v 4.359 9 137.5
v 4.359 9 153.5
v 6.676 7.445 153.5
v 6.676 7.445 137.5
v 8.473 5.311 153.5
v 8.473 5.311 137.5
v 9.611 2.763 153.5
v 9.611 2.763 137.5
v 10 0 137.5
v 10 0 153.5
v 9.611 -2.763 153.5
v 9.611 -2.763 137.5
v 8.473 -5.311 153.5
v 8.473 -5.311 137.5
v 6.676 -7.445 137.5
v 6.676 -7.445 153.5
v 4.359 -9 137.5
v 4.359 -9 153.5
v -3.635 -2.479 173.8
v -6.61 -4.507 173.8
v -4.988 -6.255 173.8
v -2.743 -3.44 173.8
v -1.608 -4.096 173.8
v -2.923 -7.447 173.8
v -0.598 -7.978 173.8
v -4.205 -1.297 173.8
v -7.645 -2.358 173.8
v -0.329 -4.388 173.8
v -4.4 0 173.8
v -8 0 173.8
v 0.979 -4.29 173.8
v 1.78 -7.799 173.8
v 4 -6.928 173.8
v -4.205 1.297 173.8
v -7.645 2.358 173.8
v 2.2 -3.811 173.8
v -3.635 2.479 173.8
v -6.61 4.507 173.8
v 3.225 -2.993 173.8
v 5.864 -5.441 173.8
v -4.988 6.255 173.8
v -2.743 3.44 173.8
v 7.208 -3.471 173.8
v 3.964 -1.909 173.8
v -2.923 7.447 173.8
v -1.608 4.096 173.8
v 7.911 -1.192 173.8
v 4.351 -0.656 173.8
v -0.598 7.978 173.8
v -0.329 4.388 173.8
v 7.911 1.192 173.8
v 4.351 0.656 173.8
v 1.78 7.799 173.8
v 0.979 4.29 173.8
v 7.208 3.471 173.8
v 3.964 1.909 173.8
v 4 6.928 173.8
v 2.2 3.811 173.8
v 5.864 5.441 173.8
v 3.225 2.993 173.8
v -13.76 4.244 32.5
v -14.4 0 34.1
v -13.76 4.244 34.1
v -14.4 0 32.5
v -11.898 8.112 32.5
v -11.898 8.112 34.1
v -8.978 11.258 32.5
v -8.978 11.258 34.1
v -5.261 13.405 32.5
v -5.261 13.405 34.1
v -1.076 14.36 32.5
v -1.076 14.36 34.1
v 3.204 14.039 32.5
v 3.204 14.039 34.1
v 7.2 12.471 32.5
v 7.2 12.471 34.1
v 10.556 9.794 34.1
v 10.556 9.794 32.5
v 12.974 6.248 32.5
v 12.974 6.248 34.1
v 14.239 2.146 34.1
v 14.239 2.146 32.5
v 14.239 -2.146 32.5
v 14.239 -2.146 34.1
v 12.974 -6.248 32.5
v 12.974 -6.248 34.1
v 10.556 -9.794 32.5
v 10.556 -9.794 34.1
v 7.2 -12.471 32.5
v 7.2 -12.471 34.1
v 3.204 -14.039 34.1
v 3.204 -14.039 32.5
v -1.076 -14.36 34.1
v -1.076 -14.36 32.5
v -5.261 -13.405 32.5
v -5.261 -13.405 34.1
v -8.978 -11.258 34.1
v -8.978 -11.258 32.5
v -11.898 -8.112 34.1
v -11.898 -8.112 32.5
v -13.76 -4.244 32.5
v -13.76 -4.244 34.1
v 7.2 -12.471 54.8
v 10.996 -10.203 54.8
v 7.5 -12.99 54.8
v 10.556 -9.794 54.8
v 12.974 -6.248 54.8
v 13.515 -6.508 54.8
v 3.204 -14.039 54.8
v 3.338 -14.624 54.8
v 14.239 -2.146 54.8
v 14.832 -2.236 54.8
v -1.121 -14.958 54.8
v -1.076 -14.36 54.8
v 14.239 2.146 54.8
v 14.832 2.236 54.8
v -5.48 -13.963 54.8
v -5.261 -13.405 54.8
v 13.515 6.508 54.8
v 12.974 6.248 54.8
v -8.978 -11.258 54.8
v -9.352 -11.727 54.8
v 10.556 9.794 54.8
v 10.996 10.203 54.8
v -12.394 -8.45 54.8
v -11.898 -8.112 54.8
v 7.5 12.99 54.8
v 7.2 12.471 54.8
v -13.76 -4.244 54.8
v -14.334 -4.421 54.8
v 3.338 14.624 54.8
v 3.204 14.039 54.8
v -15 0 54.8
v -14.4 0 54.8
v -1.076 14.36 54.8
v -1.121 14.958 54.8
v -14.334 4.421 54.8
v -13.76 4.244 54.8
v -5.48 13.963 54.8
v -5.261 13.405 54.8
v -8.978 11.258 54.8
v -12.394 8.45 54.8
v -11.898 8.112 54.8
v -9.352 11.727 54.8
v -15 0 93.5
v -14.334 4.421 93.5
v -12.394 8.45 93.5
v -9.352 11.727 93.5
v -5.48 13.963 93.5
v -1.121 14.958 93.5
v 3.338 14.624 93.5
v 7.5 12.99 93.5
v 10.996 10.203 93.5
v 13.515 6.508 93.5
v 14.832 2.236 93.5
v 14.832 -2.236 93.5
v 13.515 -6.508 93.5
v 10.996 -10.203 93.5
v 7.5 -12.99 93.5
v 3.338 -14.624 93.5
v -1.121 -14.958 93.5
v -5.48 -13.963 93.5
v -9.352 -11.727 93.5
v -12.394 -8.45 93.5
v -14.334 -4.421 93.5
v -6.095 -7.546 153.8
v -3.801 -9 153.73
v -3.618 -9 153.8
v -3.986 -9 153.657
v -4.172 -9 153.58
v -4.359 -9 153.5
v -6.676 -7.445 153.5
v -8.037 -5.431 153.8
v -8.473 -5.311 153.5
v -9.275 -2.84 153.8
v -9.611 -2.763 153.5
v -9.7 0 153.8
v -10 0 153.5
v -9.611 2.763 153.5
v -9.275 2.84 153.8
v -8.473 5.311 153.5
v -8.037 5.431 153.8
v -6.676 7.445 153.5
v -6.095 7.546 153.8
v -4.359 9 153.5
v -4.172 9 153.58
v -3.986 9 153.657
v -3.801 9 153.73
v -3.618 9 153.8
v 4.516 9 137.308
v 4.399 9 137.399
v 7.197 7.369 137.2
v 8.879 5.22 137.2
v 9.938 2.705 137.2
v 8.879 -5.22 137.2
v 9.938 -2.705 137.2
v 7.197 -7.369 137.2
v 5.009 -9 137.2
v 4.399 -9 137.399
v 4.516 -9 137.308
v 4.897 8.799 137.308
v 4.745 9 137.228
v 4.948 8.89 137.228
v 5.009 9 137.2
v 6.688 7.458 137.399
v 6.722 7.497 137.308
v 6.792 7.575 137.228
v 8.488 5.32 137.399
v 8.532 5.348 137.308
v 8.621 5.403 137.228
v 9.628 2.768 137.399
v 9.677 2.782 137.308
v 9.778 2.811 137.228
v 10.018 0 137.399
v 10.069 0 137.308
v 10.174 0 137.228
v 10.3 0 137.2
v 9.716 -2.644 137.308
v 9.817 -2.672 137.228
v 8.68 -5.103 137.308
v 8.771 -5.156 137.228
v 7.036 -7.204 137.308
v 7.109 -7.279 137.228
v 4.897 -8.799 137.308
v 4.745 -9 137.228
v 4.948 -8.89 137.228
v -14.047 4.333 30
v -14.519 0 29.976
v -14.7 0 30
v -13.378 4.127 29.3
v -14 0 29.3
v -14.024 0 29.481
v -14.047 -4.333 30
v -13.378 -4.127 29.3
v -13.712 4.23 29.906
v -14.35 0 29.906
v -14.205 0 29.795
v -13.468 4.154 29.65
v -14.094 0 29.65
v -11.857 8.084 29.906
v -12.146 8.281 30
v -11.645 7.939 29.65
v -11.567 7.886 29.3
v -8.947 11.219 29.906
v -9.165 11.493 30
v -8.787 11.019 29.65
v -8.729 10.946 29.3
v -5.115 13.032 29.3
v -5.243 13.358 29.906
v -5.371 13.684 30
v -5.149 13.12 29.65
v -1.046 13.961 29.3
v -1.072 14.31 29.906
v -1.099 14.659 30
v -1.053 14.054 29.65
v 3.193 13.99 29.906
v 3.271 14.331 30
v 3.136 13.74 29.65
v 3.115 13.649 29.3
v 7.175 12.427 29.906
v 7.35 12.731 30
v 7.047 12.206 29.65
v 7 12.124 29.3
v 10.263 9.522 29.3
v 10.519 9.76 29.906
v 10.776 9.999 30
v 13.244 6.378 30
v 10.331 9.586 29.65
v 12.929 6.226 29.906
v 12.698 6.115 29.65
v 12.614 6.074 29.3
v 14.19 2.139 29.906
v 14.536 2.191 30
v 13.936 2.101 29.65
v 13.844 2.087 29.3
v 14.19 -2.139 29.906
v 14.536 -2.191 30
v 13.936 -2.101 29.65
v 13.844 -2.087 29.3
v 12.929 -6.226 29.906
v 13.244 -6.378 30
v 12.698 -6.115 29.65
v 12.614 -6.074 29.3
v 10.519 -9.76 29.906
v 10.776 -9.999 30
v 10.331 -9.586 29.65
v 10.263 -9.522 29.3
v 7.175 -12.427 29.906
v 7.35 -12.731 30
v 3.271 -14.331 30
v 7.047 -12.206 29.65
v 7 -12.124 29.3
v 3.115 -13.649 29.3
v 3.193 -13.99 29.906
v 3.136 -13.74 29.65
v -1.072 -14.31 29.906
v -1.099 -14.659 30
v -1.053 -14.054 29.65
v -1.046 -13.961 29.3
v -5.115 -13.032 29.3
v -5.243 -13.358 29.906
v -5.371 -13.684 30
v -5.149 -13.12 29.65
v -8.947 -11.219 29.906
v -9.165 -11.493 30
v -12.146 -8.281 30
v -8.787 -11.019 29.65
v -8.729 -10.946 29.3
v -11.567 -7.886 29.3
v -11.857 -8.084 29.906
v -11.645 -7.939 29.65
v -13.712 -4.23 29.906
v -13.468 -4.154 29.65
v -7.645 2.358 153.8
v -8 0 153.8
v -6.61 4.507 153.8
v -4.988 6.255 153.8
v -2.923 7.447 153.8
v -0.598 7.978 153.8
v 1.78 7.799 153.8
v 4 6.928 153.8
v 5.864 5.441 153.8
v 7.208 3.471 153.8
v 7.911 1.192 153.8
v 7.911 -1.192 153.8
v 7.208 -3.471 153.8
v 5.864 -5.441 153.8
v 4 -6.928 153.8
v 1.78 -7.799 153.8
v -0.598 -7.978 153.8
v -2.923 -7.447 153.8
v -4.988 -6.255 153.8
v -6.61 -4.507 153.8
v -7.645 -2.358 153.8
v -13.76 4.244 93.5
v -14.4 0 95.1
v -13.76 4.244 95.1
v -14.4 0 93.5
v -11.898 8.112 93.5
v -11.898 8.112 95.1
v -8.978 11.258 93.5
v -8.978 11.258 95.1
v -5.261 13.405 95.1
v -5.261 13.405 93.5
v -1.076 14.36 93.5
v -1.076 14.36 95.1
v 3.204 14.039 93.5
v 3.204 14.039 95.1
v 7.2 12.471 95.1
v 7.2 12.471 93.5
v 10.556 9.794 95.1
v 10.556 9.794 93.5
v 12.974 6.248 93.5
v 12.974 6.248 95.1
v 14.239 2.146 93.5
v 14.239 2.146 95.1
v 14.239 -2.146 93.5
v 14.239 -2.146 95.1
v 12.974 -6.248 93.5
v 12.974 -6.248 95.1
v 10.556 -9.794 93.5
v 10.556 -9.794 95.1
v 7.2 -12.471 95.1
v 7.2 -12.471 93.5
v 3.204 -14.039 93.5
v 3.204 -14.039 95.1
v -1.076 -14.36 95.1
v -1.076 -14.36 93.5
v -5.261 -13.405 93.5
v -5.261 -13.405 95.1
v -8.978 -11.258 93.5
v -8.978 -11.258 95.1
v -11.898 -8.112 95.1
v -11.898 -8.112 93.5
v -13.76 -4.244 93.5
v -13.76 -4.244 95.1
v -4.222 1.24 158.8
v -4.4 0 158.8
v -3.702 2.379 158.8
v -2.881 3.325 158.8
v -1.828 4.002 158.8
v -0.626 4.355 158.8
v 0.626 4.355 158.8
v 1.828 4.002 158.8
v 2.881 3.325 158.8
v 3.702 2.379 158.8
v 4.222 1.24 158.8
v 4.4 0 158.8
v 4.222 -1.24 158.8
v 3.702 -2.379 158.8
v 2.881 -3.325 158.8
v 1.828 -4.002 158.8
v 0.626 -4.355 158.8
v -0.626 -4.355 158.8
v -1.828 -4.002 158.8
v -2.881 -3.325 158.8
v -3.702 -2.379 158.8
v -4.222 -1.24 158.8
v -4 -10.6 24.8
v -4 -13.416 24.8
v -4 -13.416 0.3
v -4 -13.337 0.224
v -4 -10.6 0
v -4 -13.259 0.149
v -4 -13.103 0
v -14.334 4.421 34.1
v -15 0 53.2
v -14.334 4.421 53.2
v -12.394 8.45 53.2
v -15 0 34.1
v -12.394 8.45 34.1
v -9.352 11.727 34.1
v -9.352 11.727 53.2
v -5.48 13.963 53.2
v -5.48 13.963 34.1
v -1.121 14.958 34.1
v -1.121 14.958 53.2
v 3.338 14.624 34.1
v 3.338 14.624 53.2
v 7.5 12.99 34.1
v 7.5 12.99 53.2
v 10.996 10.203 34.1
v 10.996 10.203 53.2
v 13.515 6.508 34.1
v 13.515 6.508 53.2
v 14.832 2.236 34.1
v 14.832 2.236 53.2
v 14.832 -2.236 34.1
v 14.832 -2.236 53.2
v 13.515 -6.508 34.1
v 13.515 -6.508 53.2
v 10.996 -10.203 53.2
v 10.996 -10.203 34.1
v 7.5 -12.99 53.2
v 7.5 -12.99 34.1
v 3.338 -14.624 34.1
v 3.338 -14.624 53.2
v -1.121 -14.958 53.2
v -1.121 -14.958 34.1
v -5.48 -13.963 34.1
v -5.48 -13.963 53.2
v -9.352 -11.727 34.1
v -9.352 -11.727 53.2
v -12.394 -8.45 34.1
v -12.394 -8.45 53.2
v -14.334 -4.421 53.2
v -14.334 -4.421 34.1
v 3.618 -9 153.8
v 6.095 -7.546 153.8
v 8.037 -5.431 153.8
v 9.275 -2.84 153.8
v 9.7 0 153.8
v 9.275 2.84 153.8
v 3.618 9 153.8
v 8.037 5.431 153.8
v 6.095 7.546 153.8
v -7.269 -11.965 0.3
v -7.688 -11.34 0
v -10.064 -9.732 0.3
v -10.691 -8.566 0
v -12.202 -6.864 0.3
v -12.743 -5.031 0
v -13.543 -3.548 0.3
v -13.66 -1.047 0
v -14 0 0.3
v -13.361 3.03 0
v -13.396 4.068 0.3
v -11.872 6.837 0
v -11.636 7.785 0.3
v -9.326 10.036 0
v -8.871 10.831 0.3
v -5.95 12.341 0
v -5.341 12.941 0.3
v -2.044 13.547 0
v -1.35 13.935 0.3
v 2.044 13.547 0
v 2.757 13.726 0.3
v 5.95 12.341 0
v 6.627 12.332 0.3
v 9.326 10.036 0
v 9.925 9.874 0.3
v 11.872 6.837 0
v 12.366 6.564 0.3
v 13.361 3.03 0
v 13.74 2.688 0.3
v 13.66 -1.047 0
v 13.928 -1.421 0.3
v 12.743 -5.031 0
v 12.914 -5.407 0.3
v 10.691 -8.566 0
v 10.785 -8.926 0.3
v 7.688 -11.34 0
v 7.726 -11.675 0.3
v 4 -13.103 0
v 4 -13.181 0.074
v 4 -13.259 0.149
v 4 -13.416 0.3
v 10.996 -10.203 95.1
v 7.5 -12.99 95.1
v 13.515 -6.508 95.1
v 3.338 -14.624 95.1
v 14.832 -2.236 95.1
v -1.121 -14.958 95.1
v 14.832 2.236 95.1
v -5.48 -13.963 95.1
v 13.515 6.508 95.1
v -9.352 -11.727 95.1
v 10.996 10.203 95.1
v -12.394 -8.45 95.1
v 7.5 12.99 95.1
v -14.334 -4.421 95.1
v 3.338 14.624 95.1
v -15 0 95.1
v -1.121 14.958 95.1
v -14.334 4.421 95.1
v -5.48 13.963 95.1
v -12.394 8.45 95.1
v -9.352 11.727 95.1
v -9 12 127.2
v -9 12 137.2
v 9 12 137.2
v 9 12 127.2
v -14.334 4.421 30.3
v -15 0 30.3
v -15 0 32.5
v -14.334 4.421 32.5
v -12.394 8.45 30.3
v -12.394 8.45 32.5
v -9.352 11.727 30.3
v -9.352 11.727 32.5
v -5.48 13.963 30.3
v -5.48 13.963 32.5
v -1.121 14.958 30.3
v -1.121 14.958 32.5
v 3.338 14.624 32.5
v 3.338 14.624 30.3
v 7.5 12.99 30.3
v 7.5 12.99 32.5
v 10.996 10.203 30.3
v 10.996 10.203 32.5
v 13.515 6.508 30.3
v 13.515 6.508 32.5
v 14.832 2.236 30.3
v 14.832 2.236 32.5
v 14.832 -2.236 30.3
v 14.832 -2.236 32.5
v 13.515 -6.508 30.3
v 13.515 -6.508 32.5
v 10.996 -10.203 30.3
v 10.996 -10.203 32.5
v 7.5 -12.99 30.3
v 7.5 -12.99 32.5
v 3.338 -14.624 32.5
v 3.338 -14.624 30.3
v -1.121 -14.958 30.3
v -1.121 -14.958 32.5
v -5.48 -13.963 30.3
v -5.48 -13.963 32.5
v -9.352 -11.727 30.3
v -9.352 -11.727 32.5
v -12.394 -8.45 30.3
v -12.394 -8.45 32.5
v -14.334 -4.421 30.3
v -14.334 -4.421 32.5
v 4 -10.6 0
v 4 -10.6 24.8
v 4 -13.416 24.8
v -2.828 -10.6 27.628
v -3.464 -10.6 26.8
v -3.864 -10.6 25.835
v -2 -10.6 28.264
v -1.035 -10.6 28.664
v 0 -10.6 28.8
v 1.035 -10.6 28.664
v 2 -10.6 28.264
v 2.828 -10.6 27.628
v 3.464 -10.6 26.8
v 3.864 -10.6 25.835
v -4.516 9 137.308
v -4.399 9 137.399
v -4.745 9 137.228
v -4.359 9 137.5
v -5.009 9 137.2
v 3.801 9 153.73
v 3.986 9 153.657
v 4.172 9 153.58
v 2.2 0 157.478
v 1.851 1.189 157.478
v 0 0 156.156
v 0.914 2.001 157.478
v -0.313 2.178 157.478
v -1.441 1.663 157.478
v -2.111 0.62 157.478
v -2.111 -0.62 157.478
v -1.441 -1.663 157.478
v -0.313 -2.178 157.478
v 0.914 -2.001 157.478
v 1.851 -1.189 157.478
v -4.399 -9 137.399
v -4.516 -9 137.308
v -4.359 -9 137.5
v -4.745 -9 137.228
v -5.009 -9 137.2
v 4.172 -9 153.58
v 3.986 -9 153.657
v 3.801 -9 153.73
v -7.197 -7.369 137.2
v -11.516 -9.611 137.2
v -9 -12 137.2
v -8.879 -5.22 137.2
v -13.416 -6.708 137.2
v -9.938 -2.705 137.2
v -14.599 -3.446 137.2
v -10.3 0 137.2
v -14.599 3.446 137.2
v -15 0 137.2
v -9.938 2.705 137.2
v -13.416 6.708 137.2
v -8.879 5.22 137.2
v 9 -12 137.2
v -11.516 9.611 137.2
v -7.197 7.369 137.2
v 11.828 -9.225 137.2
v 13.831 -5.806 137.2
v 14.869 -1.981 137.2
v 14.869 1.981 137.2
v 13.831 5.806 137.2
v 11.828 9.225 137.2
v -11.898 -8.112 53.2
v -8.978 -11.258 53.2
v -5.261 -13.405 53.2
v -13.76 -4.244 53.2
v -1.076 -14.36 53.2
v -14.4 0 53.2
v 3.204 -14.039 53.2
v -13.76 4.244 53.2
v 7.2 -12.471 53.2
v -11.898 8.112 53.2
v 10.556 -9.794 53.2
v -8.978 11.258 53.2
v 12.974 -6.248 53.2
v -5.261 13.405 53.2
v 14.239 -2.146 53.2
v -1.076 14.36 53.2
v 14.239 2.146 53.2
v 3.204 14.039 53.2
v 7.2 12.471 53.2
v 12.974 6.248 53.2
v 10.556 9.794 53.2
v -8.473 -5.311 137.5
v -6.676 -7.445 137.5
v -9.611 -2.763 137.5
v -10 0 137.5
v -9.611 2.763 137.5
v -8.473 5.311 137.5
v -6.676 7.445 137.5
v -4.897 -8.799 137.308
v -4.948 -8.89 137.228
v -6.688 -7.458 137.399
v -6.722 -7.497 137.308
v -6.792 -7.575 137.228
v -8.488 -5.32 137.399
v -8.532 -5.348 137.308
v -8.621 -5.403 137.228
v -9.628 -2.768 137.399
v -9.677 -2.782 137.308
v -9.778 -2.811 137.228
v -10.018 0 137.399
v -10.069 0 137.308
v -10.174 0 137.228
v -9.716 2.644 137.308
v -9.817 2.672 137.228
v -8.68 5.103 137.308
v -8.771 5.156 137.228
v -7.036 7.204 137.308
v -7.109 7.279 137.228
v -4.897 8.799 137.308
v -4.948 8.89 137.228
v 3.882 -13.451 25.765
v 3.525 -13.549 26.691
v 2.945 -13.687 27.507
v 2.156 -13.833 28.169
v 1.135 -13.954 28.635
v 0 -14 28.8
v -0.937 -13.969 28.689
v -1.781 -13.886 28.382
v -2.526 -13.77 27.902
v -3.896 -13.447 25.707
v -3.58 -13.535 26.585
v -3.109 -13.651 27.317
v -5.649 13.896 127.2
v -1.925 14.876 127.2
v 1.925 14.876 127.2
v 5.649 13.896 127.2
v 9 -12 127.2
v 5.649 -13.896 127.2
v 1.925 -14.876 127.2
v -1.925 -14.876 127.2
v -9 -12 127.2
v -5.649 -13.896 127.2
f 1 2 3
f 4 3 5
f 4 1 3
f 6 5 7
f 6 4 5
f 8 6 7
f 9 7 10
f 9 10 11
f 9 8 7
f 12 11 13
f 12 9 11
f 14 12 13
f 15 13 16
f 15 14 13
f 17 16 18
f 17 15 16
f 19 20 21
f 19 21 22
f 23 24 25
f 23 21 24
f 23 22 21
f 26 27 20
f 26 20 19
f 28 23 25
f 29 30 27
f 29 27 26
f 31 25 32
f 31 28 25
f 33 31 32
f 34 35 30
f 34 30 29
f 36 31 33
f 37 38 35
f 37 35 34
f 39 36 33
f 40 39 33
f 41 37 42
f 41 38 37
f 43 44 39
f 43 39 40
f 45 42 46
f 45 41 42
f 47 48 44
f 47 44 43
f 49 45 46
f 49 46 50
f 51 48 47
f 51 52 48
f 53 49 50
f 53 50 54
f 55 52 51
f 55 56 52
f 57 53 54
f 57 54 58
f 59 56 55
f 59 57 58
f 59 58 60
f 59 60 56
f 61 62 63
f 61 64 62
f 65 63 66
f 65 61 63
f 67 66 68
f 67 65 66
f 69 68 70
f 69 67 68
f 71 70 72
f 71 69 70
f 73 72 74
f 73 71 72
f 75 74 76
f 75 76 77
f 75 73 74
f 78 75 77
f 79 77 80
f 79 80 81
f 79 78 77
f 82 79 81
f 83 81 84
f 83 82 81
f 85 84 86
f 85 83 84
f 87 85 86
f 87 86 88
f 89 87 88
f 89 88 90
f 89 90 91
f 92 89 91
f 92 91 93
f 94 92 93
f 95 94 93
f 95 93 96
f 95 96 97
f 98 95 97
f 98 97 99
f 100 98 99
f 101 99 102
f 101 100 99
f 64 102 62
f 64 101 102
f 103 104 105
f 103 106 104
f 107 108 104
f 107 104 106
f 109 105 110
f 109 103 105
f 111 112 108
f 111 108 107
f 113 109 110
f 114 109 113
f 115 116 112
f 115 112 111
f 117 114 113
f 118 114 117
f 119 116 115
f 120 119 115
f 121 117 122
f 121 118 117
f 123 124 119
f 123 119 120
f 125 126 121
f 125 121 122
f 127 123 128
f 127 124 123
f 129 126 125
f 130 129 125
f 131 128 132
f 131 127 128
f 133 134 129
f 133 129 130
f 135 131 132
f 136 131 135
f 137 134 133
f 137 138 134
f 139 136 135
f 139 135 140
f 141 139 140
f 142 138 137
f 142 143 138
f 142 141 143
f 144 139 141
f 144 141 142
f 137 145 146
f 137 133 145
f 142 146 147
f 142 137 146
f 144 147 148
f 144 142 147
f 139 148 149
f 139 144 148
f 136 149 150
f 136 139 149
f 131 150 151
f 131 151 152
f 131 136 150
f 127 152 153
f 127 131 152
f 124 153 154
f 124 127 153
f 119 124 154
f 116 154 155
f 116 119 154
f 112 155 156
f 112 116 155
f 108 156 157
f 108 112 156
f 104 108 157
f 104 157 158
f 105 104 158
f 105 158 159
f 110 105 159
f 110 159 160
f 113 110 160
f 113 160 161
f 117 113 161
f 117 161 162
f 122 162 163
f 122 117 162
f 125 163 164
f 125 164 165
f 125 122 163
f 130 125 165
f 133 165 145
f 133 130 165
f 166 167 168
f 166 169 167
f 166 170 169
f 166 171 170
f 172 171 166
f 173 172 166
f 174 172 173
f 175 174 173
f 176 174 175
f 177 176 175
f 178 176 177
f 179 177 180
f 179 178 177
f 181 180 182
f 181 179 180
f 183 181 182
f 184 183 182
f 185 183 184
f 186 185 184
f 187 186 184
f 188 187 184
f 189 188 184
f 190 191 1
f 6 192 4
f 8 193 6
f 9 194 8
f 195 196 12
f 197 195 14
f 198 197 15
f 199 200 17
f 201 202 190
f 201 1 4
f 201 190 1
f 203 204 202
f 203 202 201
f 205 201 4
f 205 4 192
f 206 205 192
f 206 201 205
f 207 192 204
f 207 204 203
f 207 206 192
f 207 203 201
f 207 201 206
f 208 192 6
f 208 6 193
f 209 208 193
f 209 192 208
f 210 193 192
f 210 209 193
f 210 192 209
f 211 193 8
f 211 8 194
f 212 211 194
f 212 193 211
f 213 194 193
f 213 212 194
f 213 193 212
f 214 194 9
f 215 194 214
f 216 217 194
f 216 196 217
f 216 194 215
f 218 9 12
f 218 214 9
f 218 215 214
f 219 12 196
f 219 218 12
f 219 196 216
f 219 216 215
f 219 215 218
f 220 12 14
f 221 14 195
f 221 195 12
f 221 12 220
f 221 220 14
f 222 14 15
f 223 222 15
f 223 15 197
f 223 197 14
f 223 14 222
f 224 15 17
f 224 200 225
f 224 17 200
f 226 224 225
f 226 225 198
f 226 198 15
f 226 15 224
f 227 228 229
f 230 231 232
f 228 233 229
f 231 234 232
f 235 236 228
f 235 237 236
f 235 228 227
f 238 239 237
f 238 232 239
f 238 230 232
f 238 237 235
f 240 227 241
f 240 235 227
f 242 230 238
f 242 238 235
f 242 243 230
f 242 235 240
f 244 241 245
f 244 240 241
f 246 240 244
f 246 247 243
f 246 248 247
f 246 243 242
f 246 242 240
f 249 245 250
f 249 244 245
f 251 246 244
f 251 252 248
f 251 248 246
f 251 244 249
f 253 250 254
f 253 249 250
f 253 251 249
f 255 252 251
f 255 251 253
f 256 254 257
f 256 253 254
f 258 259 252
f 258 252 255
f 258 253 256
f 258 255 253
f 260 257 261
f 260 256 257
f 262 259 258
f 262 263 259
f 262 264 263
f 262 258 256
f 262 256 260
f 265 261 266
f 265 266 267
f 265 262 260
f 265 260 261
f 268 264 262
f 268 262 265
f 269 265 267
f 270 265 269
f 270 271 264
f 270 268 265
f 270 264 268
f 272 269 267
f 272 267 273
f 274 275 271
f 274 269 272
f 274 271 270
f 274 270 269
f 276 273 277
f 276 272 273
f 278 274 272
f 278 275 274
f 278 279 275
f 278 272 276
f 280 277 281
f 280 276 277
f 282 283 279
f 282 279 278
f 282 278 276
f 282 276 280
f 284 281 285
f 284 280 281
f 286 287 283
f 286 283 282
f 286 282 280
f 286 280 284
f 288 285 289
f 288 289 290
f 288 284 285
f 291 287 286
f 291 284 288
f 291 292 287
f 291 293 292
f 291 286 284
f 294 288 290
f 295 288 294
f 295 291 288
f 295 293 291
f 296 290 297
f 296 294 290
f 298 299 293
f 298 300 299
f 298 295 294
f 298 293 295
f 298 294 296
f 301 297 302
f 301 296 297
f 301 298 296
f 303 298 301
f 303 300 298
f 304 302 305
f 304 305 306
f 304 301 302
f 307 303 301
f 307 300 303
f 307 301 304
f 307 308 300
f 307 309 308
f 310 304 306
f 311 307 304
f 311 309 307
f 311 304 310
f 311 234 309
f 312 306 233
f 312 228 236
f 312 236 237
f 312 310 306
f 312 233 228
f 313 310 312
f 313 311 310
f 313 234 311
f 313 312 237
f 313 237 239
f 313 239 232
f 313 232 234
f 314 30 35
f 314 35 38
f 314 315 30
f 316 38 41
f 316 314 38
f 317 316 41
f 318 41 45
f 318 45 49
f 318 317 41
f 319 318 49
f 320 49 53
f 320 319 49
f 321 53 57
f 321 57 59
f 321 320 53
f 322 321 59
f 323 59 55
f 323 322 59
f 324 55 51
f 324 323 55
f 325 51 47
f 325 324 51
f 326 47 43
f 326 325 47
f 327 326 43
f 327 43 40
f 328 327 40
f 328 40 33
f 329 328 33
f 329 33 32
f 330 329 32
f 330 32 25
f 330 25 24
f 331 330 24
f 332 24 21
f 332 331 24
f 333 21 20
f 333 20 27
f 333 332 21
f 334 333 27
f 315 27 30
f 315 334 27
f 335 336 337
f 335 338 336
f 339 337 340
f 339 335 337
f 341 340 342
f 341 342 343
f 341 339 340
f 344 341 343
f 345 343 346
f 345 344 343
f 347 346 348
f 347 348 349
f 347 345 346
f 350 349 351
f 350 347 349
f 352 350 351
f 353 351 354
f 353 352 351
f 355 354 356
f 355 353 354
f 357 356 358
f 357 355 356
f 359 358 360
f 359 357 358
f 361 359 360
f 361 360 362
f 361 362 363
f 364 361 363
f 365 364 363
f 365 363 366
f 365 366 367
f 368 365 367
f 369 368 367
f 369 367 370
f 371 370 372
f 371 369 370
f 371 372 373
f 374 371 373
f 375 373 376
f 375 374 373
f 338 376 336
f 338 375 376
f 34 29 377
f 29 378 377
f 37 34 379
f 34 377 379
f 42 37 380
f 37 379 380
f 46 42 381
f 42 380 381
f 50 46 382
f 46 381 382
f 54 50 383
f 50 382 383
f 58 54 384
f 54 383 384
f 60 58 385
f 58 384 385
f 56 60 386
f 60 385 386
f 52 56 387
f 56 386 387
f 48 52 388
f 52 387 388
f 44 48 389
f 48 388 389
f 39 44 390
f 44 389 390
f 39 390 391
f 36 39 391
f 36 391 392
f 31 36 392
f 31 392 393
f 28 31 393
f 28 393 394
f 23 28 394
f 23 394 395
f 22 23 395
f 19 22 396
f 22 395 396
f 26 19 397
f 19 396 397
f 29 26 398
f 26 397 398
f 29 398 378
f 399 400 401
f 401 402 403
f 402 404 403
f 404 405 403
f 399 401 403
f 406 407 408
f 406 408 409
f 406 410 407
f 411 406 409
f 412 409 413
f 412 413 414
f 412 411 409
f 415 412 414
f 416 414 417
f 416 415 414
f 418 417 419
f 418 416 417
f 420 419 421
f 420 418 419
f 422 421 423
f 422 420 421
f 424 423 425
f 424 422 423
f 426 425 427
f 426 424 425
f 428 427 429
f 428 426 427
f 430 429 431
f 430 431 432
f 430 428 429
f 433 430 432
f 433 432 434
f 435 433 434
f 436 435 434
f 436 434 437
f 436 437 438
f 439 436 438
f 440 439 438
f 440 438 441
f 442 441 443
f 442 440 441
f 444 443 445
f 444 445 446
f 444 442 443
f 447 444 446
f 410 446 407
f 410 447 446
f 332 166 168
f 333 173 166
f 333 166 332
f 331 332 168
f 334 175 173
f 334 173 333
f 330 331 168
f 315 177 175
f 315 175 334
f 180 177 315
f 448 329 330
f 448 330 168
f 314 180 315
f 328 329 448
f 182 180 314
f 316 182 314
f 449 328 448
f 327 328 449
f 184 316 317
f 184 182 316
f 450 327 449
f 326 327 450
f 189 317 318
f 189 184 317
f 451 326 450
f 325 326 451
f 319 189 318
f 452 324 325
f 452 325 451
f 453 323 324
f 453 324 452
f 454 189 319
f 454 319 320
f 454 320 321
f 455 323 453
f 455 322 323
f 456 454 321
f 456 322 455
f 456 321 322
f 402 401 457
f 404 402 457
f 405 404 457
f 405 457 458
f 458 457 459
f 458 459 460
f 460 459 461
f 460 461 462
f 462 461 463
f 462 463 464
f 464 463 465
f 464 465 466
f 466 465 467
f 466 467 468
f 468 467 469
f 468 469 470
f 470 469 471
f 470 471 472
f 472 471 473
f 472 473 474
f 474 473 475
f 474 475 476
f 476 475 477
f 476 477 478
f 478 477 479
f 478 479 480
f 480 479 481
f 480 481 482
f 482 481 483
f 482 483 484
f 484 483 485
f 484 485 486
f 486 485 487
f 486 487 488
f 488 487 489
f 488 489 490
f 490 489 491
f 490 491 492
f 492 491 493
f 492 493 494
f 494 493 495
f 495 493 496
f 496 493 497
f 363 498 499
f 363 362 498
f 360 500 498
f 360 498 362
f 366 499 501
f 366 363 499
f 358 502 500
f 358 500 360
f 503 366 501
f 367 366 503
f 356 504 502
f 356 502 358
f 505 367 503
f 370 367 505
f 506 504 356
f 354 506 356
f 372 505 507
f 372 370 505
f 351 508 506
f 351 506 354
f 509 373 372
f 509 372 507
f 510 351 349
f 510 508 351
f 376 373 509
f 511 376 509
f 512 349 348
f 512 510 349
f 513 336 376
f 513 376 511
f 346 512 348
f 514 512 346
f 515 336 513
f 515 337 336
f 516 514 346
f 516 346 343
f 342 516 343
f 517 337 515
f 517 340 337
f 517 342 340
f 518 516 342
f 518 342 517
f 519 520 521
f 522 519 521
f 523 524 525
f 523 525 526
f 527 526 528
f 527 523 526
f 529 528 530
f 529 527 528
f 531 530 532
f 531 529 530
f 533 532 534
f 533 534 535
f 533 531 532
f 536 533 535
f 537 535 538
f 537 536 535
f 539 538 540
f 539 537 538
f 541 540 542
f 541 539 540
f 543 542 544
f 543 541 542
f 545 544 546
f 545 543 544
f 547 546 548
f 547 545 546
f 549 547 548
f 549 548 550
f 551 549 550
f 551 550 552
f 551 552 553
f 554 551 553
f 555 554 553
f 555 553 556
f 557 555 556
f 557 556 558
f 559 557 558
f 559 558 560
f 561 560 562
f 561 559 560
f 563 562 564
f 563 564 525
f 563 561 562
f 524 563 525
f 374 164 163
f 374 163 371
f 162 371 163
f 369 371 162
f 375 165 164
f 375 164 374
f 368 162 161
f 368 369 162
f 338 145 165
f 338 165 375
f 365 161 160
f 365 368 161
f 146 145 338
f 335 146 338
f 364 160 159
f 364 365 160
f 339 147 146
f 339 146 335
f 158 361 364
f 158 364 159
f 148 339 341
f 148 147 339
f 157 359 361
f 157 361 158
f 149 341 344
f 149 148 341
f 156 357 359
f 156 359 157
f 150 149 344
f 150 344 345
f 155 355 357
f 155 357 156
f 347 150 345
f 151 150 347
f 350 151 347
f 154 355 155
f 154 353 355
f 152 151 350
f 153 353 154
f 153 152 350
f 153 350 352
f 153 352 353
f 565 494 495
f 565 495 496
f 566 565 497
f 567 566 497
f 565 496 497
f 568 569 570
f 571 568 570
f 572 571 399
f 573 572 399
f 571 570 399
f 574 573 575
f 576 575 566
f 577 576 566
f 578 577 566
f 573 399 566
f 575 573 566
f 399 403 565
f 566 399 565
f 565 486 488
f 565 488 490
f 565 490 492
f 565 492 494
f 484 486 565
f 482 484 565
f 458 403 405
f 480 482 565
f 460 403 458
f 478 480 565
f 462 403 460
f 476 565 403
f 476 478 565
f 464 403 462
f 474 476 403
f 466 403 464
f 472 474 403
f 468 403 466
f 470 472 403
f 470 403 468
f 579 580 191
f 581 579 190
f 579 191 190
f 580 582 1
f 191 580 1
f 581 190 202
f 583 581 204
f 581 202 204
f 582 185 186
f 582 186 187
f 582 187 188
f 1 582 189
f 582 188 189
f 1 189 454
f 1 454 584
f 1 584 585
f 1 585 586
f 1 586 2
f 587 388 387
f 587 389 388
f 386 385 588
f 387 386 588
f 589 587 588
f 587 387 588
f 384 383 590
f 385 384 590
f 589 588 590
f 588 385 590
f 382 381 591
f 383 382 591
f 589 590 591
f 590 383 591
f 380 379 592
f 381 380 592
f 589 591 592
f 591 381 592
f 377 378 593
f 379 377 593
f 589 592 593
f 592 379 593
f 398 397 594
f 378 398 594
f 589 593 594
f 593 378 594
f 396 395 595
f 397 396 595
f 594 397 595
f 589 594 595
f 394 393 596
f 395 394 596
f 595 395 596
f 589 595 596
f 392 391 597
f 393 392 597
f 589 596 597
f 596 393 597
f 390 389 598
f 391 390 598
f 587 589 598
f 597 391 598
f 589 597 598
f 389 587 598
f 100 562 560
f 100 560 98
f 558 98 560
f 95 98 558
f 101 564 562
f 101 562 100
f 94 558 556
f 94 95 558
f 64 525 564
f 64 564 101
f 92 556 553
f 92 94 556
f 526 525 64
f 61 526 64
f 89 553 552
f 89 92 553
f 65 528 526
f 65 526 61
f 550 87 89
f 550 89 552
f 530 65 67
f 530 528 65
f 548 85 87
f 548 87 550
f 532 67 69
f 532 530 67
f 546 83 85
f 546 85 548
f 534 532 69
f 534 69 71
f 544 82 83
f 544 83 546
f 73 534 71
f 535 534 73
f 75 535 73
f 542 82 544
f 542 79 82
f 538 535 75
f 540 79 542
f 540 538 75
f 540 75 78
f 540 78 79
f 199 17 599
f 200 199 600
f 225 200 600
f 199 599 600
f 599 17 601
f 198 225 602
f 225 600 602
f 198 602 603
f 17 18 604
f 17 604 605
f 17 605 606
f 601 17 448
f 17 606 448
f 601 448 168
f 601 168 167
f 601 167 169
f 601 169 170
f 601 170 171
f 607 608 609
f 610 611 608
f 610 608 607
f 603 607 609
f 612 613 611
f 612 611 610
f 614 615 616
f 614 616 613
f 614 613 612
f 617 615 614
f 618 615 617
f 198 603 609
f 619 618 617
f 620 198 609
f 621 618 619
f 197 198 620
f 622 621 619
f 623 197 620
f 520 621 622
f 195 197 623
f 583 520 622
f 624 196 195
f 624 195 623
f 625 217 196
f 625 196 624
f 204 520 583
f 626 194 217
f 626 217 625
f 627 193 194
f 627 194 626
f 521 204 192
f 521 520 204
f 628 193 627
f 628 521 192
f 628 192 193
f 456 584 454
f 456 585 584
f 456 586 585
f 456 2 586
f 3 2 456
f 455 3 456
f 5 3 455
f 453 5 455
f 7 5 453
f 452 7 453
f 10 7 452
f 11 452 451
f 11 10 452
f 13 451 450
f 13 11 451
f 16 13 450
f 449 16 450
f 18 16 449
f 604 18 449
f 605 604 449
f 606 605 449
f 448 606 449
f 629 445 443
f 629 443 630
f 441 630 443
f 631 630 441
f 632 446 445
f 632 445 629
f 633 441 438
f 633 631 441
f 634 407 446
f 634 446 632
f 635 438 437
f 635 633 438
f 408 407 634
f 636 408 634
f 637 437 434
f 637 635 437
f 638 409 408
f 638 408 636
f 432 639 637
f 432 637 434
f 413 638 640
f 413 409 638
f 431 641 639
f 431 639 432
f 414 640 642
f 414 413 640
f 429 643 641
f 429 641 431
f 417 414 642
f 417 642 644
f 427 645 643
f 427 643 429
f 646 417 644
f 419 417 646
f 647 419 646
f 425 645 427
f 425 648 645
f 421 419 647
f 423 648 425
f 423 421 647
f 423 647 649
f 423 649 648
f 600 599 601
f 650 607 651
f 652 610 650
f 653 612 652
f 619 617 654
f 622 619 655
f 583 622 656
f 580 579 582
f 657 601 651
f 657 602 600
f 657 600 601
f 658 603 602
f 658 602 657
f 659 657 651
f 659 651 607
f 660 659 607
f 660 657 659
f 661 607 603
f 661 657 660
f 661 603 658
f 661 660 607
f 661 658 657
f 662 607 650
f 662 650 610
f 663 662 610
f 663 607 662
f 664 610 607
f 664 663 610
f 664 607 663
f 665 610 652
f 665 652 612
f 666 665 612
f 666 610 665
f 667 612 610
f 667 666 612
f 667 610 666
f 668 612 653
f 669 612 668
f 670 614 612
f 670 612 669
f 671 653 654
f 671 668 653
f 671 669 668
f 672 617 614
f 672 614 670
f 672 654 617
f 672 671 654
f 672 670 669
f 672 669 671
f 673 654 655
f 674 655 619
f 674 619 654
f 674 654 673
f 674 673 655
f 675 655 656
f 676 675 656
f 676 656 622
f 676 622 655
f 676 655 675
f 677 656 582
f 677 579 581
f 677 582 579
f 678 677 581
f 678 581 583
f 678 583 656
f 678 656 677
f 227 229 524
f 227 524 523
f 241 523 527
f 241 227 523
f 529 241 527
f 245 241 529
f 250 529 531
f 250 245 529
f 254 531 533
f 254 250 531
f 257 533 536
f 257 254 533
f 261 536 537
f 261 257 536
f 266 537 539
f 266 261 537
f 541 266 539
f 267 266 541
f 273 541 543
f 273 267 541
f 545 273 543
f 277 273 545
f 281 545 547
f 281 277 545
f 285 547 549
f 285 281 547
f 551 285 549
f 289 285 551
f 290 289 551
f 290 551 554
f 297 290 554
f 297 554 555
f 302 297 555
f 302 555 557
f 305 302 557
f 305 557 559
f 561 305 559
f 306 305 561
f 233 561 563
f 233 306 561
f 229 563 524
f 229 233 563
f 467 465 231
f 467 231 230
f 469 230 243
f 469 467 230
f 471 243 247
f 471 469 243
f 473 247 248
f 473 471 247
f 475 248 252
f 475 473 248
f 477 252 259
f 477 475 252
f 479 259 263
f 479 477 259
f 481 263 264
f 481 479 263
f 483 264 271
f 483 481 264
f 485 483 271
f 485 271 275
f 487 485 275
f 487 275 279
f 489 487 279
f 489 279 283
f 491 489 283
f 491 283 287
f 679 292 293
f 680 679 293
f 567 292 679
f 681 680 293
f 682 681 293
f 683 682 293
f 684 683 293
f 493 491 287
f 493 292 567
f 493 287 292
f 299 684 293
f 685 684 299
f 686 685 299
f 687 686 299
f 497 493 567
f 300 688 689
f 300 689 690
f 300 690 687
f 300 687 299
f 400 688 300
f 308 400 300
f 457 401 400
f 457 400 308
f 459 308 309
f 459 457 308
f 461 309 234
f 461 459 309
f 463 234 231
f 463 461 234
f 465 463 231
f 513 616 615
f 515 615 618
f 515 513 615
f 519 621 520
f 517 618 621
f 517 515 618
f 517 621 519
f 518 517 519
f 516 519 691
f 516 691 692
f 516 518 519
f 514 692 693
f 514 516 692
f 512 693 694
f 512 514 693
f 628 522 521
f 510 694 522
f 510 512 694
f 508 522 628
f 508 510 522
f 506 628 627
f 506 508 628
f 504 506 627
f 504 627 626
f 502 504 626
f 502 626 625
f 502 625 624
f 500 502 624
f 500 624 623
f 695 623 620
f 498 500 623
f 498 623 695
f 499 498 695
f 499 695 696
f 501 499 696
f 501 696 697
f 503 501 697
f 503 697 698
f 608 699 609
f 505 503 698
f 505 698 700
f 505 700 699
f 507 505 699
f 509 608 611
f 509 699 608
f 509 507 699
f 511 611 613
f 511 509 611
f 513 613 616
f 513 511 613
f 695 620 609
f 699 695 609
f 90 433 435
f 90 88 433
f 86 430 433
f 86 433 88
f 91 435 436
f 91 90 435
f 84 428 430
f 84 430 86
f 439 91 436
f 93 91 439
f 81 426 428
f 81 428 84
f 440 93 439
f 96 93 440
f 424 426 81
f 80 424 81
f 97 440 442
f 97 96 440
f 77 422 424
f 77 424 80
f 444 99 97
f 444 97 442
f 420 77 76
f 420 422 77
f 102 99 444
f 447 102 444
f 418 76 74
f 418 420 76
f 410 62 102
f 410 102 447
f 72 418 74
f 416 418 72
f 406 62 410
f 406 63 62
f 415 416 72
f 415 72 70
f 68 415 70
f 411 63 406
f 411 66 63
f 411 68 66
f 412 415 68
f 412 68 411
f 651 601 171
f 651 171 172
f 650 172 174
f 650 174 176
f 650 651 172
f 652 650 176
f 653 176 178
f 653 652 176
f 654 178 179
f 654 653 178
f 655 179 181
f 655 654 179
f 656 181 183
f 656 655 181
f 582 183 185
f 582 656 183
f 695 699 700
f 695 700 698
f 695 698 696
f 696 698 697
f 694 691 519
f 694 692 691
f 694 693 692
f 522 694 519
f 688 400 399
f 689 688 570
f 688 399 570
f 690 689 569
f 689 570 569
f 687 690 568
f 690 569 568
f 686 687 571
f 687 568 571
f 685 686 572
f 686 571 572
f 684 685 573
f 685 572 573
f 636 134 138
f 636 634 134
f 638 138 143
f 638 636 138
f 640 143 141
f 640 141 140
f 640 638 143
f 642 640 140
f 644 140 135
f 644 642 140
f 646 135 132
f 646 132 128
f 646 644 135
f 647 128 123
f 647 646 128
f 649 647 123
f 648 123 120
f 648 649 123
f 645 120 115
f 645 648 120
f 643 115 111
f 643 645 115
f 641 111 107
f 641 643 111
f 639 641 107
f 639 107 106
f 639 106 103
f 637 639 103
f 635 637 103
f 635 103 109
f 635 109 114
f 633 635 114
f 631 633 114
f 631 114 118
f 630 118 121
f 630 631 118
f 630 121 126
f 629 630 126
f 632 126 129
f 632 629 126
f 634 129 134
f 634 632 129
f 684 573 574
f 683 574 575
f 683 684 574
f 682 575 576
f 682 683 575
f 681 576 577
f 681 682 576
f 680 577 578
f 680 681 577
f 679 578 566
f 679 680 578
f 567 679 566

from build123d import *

# Parameters (mm, degrees)
F2_SIZE   = 0.29999
F4_DEPTH  = 28.8
F5_R      = 3.9999
F6_W      = 16.3141209632
F6_H      = 1.5053940788
F7_DEPTH  = 16.6
F8_W      = 11.3712083548
F8_H      = 5.6990628242
F9_DEPTH  = 10
F11_D     = 8.8
F11_DEPTH = 15
F11_TIP   = 2.6437867237


# Not quite as in the source:
# - a fillet or chamfer is up to 0.001 mm smaller than in the source, because OpenCascade refuses the exact size


with BuildPart() as f1:
    # F0 (on Front) → F1 (revolve)
    with BuildSketch(Plane.XZ):
        with BuildLine():
            Line((-14, 0), (0, 0))
            Line((0, 0), (0, 173.8))
            Line((0, 173.8), (-8, 173.8))
            Line((-8, 173.8), (-8, 153.8))
            Line((-8, 153.8), (-10, 153.8))
            Line((-10, 153.8), (-10, 137.5))
            ThreePointArc((-10, 137.5), (-10.0878679656, 137.2878679656), (-10.3, 137.2))
            Line((-10.3, 137.2), (-15, 137.2))
            Line((-15, 137.2), (-15, 137))
            Line((-15, 137), (-15, 136.8790119886))
            Line((-15, 136.8790119886), (-15, 95.1))
            Line((-15, 95.1), (-14.4, 95.1))
            Line((-14.4, 95.1), (-14.4, 93.5))
            Line((-14.4, 93.5), (-15, 93.5))
            Line((-15, 93.5), (-15, 54.8))
            Line((-15, 54.8), (-14.4, 54.8))
            Line((-14.4, 54.8), (-14.4, 53.2))
            Line((-14.4, 53.2), (-15, 53.2))
            Line((-15, 53.2), (-15, 34.1))
            Line((-15, 34.1), (-14.4, 34.1))
            Line((-14.4, 34.1), (-14.4, 32.5))
            Line((-14.4, 32.5), (-15, 32.5))
            Line((-15, 32.5), (-15, 30))
            Line((-15, 30), (-14.7, 30))
            ThreePointArc((-14.7, 30), (-14.2050252532, 29.7949747468), (-14, 29.3))
            Line((-14, 29.3), (-14, 0))
        make_face()
    revolve(axis=Axis((0, 0, 86.9), (0, 0, -1)))

    # F2 (size 0.3 in the source; OpenCascade refuses exactly that, so slightly less here)
    f2_edges = [f1.edges().sort_by_distance(p)[0] for p in [
        (15, 0, 30),
        (10, 0, 153.8),
        (14, 0, 0),
    ]]
    chamfer(f2_edges, length=F2_SIZE)

    # F3 (on face) → F4 (cut)
    with BuildSketch(Plane(origin=(0, 0, 0), x_dir=(1, 0, 0), z_dir=(0, 0, -1))):
        Polygon((4, 14), (0, 14), (-4, 14), (-4, 10.6), (0, 10.6), (4, 10.6), align=None)
    extrude(amount=-F4_DEPTH, mode=Mode.SUBTRACT)

    # F5 (radius 4 in the source; OpenCascade refuses exactly that, so slightly less here)
    f5_edges = [f1.edges().sort_by_distance(p)[0] for p in [
        (4, -12.008204, 28.8),
        (-4, -12.008204, 28.8),
    ]]
    fillet(f5_edges, radius=F5_R)

    # F6 (on face) → F7 (cut, through all)
    with BuildSketch(Plane.XY.offset(153.8)):
        with Locations((-8.1570604816, -9.7526970394)):
            Rectangle(F6_W, F6_H)
        with Locations((8.1570604816, -9.7526970394)):
            Rectangle(F6_W, F6_H)
        Polygon((-16.3141209632, 9), (0, 9), (16.3141209632, 9), (16.3141209632, 10.5053940788), (0, 10.5053940788), (-16.3141209632, 10.5053940788), align=None)
    extrude(amount=-F7_DEPTH, mode=Mode.SUBTRACT)

    # F8 (on face) → F9 (cut)
    with BuildSketch(Plane.XY.offset(137.2)):
        with Locations((5.6856041774, 14.8495314121)):
            Rectangle(F8_W, F8_H)
        with Locations((-5.6856041774, 14.8495314121)):
            Rectangle(F8_W, F8_H)
        Polygon((0, -17.6990628242), (11.3712083548, -17.6990628242), (11.3712083548, -12), (0, -12), (-11.3712083548, -12), (-11.3712083548, -17.6990628242), align=None)
    extrude(amount=-F9_DEPTH, mode=Mode.SUBTRACT)

    # F11
    with Locations(Plane.XY.offset(173.8)):
        with Locations((0, 0)):
            Hole(F11_D / 2, depth=F11_DEPTH)
            with Locations((0, 0, -(F11_DEPTH + F11_TIP / 2))):  # 118° drill point
                Cone(0, F11_D / 2, F11_TIP, mode=Mode.SUBTRACT)


solid = f1.part
